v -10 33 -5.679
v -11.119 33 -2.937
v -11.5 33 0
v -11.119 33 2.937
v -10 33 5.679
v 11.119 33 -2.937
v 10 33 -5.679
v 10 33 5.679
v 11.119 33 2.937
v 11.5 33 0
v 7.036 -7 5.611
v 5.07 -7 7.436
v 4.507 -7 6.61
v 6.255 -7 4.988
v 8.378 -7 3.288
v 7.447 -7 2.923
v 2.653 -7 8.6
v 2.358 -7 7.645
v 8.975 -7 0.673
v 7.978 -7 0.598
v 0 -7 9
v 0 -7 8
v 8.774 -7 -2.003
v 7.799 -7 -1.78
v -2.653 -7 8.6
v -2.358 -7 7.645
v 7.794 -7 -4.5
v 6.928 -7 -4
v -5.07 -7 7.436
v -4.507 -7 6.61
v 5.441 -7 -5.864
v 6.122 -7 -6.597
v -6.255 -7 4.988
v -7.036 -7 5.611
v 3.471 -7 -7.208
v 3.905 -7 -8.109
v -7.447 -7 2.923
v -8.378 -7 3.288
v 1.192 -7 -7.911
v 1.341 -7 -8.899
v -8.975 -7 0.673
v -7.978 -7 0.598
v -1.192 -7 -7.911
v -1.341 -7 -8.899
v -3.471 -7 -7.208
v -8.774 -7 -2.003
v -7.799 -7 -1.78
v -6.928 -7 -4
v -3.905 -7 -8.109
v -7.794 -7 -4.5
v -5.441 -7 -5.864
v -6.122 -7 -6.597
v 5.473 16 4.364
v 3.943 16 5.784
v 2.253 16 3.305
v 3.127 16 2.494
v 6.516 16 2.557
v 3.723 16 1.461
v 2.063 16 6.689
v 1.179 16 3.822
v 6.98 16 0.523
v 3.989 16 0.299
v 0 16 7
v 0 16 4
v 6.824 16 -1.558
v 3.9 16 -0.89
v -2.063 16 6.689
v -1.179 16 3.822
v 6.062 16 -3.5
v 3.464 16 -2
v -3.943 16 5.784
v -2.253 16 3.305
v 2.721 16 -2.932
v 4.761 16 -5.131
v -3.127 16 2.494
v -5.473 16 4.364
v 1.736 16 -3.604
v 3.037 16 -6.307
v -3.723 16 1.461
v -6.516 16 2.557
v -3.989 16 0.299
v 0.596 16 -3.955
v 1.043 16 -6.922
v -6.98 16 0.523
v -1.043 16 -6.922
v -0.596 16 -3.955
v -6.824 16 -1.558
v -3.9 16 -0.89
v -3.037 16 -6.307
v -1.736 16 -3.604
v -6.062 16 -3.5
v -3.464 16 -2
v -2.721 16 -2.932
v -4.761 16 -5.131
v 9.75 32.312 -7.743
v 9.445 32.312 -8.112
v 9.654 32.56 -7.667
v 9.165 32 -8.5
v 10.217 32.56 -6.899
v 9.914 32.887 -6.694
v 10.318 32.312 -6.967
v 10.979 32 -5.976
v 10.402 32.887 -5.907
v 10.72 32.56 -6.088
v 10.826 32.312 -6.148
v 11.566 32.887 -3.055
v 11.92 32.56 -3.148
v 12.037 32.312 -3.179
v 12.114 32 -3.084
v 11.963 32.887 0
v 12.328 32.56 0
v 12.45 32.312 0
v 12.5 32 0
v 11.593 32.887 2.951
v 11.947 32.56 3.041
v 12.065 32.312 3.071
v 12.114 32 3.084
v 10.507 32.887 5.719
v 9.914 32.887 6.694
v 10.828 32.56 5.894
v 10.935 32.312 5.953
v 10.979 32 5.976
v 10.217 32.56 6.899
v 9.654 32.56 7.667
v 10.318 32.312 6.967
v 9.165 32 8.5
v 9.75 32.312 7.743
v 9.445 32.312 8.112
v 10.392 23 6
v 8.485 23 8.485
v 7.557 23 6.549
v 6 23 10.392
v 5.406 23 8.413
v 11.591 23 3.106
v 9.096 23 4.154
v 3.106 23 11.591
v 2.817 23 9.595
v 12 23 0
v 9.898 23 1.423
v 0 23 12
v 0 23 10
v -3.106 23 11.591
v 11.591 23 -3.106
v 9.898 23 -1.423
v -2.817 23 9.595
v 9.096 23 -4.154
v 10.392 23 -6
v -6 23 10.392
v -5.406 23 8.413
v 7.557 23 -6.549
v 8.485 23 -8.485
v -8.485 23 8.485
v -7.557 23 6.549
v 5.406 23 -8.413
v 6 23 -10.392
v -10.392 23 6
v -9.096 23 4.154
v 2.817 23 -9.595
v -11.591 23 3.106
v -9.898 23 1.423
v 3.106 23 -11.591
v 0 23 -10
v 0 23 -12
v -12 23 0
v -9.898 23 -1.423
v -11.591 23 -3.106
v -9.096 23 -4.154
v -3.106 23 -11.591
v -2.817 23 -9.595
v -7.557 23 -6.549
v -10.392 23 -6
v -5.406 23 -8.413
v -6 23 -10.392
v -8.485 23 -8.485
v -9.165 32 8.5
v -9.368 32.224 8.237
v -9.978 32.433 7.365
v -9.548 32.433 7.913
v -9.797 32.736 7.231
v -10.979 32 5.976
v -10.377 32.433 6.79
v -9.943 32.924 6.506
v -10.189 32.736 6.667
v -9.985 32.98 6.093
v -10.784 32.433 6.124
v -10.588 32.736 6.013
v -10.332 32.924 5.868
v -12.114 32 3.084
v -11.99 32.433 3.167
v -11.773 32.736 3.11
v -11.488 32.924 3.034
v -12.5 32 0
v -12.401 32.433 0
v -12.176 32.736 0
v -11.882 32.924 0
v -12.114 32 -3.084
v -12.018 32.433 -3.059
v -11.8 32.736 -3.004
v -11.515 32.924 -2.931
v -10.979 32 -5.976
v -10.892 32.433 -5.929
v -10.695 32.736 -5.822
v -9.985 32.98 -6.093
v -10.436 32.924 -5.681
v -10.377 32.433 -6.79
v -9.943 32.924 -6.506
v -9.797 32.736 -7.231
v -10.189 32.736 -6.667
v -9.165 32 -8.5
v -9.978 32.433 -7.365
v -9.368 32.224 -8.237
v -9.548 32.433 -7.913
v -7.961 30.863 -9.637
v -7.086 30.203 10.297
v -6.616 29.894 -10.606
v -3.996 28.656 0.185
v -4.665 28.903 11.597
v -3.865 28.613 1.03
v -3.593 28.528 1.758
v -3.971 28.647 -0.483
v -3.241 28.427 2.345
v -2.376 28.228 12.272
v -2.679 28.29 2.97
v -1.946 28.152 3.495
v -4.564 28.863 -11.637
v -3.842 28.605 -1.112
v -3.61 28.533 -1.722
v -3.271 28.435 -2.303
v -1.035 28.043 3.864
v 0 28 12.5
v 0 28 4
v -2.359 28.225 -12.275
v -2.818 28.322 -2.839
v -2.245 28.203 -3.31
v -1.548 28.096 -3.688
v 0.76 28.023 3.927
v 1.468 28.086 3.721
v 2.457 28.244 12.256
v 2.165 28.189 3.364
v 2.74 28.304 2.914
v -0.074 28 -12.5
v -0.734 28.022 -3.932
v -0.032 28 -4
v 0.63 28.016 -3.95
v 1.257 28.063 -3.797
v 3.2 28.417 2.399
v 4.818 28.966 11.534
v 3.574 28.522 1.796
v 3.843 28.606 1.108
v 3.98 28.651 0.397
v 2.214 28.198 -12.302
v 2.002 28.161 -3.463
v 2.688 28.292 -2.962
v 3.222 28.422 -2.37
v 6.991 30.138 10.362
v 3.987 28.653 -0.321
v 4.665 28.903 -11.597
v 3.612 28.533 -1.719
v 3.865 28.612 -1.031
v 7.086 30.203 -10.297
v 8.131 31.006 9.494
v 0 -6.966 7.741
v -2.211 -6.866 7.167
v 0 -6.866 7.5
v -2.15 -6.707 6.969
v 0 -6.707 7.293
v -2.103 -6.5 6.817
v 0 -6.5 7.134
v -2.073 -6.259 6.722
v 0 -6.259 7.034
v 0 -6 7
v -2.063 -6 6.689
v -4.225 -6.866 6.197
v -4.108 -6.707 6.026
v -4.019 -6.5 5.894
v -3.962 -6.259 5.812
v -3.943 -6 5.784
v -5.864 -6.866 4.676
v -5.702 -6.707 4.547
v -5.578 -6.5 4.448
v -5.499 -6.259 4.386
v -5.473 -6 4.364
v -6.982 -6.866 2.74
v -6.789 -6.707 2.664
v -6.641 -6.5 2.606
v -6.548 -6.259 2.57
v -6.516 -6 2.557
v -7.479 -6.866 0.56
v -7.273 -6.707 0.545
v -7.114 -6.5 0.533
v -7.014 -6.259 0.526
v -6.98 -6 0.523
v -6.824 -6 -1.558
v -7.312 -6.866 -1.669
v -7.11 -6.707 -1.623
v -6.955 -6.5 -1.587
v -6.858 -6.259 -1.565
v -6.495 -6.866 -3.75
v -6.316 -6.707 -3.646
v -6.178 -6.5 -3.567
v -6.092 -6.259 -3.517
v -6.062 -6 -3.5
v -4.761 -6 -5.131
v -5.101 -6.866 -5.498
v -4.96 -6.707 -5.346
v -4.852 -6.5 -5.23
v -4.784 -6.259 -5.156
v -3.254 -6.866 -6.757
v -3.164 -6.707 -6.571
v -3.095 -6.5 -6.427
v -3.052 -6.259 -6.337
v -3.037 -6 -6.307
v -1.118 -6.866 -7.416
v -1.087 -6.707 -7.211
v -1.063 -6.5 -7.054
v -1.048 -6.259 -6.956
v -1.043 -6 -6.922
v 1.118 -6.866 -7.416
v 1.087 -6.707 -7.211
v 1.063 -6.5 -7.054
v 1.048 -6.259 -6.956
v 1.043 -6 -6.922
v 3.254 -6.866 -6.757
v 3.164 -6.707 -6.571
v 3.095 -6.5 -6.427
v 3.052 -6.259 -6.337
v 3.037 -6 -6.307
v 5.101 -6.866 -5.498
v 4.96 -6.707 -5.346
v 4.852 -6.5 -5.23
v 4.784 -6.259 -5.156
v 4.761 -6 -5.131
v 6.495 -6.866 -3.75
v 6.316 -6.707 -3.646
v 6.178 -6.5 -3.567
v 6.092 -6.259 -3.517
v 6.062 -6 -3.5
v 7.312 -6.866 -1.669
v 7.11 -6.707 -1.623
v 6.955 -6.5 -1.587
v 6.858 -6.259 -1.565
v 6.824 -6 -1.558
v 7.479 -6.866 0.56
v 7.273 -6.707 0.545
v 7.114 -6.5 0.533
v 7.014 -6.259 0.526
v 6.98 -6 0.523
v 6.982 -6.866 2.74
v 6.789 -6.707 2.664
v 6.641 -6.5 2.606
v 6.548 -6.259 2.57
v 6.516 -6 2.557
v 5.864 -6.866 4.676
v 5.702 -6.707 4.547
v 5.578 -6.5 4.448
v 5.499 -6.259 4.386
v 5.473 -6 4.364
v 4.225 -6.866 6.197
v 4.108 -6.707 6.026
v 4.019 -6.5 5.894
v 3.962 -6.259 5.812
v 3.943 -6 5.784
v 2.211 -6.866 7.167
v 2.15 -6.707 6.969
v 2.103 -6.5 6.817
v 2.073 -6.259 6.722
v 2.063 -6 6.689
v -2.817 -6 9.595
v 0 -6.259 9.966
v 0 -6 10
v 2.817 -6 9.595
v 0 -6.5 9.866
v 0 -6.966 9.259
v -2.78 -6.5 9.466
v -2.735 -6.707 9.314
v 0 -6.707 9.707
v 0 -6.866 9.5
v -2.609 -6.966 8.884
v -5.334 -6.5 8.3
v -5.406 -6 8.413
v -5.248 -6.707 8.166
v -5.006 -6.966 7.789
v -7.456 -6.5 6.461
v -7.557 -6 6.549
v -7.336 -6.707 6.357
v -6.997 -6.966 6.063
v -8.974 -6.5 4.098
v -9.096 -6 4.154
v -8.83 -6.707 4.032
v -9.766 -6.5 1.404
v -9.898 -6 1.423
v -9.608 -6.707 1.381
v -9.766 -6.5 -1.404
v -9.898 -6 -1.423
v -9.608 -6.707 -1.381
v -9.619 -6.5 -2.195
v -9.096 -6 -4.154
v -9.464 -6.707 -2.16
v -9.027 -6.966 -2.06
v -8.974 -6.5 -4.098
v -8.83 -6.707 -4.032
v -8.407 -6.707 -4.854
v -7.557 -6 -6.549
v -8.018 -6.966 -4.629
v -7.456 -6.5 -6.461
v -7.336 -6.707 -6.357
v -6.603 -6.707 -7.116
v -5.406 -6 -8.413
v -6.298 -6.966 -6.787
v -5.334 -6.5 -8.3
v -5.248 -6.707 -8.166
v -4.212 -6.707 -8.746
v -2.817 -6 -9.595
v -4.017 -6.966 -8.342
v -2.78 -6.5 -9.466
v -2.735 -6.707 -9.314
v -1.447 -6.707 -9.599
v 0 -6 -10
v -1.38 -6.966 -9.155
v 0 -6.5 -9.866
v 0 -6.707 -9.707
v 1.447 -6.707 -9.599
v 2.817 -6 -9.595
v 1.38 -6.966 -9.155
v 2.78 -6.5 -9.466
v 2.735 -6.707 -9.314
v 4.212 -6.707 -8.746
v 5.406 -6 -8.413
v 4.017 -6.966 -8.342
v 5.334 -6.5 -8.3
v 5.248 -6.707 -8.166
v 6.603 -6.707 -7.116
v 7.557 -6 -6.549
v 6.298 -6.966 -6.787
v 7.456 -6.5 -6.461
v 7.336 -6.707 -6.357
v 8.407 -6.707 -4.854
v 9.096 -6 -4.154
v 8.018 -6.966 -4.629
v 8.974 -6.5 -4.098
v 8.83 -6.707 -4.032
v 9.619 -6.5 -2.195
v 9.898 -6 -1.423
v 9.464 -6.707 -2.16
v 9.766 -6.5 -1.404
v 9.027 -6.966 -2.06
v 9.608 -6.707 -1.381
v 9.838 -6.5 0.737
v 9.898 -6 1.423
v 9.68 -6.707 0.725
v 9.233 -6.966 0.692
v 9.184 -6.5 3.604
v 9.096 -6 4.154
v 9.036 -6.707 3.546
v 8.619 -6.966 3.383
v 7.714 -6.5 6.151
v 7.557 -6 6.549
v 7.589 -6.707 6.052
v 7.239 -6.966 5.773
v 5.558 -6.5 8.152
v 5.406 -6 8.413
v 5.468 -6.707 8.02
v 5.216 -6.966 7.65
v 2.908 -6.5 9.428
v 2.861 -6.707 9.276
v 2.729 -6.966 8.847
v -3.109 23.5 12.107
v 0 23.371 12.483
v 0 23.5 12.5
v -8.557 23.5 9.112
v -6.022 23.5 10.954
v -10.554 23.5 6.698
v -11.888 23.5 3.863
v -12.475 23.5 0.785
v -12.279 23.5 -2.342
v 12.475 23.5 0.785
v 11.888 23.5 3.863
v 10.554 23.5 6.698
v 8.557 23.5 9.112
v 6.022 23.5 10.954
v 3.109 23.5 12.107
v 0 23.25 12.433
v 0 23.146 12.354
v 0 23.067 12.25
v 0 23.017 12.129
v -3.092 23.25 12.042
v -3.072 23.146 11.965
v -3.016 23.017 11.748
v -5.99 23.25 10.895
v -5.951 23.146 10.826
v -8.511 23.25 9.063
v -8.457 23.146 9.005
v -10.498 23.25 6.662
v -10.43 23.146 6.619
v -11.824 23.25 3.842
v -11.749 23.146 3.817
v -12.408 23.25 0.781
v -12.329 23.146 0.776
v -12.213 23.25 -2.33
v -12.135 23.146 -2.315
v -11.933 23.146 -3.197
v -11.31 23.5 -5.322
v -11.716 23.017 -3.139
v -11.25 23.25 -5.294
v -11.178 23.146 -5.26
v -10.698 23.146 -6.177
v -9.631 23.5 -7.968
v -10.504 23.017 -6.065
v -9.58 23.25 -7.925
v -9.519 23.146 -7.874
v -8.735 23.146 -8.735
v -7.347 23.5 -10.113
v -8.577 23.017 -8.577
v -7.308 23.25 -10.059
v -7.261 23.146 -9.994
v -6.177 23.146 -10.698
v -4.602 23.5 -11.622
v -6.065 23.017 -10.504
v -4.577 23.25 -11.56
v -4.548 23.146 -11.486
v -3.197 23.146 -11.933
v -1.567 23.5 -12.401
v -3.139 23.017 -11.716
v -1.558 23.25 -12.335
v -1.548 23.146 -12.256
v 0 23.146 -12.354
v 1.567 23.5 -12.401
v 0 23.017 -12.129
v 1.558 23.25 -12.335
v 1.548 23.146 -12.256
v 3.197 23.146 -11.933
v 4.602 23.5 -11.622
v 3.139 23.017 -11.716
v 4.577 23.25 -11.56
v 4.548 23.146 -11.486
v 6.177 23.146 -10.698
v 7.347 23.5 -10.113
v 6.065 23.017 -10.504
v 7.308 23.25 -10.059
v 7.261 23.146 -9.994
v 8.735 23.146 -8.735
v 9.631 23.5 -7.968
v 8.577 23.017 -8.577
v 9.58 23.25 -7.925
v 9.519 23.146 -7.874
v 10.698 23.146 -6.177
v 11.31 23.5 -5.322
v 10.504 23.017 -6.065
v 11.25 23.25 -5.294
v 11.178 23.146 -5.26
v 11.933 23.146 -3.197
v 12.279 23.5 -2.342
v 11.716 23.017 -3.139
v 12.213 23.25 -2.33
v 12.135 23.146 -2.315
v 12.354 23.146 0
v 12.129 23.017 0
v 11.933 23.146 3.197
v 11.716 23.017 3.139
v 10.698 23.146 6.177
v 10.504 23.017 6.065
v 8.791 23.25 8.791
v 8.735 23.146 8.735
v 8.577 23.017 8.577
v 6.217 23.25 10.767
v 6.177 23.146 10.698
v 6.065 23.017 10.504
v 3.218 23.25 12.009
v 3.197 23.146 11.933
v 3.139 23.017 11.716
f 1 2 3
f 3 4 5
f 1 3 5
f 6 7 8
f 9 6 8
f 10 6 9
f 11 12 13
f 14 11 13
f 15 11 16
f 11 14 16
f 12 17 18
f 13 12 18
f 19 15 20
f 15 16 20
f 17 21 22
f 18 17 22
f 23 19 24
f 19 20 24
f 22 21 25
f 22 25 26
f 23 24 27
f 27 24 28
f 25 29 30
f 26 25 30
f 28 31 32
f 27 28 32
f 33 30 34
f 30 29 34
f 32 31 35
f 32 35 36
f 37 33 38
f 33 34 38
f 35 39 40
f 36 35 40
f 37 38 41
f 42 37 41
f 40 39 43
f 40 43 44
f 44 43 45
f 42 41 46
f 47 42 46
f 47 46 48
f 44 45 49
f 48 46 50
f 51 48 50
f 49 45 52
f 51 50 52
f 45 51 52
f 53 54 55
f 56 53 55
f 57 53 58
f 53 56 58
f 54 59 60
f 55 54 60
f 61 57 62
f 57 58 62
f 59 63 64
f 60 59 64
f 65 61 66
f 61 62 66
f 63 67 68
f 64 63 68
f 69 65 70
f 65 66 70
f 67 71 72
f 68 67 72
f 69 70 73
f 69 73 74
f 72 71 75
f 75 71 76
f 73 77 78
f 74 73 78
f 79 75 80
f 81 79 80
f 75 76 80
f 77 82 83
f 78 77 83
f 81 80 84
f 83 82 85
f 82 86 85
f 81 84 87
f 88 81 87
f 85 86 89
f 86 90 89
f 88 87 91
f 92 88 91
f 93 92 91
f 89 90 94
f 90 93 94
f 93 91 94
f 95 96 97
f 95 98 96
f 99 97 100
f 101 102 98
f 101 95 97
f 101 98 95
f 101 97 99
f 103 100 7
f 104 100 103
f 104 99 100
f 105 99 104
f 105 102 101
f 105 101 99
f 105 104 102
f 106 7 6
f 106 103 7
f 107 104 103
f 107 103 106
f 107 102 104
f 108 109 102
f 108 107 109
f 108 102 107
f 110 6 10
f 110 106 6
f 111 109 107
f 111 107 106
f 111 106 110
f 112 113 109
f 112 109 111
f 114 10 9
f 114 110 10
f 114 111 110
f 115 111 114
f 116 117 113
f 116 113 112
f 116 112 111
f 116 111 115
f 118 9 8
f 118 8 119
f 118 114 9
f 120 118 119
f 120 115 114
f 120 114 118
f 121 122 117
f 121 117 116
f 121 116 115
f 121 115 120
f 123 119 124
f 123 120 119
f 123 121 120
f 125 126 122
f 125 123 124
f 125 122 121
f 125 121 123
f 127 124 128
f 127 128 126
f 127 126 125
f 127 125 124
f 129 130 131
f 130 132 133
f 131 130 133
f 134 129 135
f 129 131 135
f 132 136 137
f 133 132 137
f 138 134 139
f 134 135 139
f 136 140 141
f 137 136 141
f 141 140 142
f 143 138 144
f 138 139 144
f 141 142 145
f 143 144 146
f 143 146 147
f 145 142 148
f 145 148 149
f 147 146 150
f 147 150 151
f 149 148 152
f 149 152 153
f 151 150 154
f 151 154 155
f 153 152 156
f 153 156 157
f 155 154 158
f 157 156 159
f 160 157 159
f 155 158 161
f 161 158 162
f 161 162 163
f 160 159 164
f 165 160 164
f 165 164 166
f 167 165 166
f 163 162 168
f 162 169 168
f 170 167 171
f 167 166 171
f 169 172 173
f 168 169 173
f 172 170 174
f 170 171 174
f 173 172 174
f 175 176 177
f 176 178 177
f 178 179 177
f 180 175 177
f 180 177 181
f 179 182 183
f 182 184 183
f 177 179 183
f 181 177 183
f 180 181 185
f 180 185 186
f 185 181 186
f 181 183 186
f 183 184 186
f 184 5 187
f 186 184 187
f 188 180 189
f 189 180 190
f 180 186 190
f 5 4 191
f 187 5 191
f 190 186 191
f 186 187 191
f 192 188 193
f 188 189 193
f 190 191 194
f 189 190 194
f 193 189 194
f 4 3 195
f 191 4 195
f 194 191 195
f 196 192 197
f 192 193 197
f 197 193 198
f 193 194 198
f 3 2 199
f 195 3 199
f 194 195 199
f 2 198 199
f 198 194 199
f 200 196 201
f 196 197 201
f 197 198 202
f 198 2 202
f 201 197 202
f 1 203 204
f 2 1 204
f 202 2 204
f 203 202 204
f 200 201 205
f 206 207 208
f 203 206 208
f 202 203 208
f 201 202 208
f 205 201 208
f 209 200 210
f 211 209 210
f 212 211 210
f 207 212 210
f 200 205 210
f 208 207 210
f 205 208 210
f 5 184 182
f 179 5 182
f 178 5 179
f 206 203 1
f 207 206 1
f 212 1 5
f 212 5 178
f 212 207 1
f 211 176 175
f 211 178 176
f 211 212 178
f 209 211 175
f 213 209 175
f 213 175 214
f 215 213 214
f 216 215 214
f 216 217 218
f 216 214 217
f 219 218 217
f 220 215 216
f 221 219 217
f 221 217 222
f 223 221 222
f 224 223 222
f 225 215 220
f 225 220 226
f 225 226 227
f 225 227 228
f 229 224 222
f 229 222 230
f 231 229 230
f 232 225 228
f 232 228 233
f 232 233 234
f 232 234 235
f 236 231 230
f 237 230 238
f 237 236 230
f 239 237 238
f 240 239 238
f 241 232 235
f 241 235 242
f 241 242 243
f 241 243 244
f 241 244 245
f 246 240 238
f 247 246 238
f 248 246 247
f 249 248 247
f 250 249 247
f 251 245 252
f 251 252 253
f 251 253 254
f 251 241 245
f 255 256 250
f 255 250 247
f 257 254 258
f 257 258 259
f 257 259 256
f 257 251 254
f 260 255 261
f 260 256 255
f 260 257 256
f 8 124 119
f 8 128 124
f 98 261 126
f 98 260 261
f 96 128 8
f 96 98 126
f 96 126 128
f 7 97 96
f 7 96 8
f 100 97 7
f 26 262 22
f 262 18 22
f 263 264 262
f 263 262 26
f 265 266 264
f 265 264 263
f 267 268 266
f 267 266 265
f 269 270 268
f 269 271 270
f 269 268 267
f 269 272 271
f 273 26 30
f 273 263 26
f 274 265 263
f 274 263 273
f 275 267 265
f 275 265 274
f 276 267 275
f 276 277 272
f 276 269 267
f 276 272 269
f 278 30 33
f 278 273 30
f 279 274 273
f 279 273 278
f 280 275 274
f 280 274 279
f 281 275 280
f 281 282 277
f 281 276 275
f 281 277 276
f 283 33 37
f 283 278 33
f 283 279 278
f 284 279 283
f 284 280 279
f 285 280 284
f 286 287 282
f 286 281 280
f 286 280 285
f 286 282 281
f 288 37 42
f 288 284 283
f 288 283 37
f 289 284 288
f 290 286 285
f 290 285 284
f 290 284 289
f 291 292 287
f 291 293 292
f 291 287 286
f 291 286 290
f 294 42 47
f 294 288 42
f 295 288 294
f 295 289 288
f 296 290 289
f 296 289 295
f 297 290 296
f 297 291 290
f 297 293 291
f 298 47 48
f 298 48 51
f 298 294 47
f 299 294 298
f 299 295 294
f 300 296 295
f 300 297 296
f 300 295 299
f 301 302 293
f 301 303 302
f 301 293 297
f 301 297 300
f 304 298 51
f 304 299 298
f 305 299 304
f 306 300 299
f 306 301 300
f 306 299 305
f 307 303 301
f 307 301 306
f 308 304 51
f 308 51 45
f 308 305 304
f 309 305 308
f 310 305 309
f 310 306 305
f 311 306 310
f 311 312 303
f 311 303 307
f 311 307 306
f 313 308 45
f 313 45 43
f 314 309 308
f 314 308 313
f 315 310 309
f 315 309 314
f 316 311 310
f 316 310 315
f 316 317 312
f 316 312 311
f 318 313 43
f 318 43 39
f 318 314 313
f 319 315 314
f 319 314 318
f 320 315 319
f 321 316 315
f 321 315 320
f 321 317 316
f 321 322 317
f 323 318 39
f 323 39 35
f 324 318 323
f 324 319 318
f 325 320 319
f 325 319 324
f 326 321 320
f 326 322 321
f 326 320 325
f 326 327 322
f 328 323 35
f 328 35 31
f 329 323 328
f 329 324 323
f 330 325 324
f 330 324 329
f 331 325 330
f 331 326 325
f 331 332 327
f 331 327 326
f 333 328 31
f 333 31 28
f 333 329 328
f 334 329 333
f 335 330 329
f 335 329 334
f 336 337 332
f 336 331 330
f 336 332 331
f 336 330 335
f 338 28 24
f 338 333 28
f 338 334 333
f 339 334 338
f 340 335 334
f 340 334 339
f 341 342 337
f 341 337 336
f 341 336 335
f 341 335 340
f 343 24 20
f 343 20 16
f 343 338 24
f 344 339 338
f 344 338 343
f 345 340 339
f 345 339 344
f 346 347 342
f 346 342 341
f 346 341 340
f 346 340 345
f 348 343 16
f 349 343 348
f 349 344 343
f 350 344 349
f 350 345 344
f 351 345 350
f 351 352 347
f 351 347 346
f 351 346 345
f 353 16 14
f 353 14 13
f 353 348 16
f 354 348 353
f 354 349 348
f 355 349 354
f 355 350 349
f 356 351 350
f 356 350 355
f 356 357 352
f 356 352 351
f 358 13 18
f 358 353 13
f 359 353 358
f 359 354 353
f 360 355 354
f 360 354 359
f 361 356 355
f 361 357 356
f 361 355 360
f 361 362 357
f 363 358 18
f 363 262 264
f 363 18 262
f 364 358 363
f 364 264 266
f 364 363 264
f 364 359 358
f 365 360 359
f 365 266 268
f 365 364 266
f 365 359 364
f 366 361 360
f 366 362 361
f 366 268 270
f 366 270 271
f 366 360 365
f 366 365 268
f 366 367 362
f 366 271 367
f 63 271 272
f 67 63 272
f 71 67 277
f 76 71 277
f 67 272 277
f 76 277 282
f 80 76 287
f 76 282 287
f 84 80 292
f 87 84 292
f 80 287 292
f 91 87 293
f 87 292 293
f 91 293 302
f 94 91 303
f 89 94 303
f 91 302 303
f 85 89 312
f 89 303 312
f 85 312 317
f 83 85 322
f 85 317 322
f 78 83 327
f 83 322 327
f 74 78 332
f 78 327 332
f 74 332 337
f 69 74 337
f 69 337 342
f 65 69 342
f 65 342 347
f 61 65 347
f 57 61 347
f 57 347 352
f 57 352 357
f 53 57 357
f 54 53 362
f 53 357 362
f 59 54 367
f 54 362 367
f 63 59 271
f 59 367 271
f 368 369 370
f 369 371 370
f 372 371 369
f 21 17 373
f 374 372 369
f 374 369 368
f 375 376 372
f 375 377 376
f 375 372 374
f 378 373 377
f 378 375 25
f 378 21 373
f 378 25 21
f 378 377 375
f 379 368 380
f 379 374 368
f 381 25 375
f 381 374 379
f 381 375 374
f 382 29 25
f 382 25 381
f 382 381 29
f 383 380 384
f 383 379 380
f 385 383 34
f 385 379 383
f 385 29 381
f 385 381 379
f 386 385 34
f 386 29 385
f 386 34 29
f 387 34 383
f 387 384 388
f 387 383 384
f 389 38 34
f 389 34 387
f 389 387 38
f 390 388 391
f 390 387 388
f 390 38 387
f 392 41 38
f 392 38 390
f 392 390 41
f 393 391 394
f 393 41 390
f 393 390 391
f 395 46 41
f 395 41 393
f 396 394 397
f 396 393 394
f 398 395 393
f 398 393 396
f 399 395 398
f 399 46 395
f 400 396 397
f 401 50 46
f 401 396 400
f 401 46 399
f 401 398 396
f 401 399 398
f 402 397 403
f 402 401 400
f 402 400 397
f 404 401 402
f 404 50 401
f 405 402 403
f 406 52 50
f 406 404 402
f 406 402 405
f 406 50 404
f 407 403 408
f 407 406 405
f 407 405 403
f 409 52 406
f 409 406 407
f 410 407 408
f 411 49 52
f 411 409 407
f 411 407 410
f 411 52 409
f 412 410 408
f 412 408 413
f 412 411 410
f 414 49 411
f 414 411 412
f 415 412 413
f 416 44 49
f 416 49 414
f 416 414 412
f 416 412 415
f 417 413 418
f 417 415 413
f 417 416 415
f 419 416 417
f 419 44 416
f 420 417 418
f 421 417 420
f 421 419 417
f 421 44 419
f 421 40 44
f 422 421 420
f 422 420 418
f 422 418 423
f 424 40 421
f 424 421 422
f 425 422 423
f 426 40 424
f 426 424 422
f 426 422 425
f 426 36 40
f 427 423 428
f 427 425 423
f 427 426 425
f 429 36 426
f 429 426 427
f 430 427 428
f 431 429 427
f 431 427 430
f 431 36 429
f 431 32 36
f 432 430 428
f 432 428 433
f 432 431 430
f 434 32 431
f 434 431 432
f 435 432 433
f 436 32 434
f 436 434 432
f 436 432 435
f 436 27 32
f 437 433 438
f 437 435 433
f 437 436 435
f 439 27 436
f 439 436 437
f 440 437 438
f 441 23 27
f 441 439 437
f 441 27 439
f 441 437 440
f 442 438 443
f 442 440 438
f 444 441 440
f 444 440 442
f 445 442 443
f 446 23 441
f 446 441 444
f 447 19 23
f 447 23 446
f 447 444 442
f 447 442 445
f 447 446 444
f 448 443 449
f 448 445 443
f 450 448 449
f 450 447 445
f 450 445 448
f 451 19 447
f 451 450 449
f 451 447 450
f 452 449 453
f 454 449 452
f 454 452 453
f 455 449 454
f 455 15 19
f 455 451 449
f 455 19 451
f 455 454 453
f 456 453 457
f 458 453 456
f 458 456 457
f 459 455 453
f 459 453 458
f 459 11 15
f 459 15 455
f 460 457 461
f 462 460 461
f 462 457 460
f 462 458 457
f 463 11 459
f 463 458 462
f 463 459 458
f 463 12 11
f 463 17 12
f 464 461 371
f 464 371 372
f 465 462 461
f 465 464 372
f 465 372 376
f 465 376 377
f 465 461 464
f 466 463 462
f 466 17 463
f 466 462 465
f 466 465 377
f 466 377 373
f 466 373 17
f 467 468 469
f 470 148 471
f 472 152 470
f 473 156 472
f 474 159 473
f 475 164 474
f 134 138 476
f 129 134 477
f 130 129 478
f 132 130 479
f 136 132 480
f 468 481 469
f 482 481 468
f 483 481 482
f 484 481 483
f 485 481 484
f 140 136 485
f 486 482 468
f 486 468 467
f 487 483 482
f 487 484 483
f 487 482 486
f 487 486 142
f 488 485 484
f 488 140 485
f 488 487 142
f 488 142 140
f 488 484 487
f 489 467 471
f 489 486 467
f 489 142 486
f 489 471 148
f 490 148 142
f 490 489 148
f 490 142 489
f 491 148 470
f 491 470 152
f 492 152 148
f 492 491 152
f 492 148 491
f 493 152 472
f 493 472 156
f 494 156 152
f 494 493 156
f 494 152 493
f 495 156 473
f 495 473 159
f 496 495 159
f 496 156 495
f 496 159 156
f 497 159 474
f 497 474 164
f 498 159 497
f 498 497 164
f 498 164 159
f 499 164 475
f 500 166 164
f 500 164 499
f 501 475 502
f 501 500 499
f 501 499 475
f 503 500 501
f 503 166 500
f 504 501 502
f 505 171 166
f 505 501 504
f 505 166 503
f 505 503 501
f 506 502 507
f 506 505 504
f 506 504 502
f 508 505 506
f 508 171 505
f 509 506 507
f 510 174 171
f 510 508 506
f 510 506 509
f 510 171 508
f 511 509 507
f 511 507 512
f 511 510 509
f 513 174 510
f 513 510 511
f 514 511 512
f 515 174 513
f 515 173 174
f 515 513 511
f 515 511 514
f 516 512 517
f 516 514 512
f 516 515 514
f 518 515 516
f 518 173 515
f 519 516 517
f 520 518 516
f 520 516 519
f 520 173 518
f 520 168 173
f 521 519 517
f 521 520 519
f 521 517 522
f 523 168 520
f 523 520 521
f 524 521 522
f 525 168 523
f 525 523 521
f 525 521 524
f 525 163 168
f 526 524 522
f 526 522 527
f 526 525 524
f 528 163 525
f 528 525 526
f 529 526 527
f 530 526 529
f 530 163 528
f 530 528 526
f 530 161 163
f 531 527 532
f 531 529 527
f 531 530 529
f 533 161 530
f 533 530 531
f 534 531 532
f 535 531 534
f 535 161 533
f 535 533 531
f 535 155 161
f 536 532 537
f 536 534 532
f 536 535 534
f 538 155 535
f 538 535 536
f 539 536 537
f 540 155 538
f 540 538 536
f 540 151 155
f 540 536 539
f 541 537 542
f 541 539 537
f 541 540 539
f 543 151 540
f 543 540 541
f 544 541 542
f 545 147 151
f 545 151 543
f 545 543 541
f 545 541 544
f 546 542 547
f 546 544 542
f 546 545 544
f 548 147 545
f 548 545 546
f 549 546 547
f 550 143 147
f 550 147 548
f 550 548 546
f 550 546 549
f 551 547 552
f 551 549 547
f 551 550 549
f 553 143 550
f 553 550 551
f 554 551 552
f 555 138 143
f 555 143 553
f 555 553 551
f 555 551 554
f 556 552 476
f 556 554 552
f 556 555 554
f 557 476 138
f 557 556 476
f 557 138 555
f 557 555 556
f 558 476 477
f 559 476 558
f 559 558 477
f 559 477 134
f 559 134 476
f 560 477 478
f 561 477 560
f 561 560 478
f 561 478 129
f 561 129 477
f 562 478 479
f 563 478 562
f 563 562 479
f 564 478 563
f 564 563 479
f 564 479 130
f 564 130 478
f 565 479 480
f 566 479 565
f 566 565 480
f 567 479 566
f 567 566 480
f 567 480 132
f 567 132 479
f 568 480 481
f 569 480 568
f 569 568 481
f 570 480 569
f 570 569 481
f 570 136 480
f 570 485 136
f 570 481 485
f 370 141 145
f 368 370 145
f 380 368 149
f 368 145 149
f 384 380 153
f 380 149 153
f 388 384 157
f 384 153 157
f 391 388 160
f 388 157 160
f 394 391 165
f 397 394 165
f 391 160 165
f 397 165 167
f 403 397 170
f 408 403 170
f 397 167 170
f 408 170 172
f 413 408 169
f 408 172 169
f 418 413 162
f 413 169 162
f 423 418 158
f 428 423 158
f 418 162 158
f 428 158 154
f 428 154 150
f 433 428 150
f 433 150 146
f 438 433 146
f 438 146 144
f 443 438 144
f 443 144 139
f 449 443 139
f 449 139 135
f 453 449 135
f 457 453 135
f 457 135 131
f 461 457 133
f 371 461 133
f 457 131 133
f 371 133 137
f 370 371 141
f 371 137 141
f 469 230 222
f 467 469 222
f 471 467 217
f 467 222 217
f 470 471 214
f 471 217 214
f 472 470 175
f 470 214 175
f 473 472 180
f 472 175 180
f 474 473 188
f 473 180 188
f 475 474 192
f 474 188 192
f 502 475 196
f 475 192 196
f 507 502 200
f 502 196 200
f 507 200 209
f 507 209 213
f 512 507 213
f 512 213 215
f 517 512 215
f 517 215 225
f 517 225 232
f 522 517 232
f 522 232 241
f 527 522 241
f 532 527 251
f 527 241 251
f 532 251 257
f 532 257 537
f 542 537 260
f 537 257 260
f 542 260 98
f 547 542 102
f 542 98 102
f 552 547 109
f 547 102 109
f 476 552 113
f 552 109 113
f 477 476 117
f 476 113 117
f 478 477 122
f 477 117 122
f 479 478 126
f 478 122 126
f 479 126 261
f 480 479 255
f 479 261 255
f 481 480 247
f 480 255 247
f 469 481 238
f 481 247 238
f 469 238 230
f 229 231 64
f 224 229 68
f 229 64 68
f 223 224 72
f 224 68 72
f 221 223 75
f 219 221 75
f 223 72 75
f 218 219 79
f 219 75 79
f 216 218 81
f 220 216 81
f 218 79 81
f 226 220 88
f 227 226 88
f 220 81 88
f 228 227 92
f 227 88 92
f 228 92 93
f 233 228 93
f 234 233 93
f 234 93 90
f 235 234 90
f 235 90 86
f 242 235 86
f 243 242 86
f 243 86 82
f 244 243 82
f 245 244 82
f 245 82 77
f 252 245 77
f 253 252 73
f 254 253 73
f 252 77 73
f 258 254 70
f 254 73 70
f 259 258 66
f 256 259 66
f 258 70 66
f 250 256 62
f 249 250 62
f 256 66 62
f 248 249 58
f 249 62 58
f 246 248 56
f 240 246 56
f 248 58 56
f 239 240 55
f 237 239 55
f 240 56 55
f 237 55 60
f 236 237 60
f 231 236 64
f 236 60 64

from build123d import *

# Parameters (mm, degrees)
CUT_EXTRUDE_1_DEPTH      = 38.436613095
CUT_EXTRUDE_1_DEPTH_BACK = 38.436613095
SKETCH_2_R               = 12.5
FILLET_1_R               = 1
FILLET_2_R               = 0.5
FILLET_3_R               = 1


with BuildPart() as part:
    # Эскиз1 → Повернуть1 (revolve)
    with BuildSketch(Plane.XY, mode=Mode.PRIVATE) as revolve_1_sk:
        Polygon((-4, 33), (-4, 16), (-7, 16), (-7, -7), (-10, -7), (-10, 23), (-12.5, 23), (-12.5, 33), align=None)
    revolve(revolve_1_sk.sketch.rotate(Axis((0, 98.834265919, 0), (0, -1, 0)), 270), axis=Axis((0, 98.834265919, 0), (0, -1, 0)))

    # Эскиз2 → Вырез-Вытянуть1 (cut, two sides: drawn at the far end of the back side and taken through both)
    with BuildSketch(Plane.XY.offset(-CUT_EXTRUDE_1_DEPTH_BACK)):
        with Locations((0, 40.5)):
            Circle(SKETCH_2_R)
    extrude(amount=CUT_EXTRUDE_1_DEPTH + CUT_EXTRUDE_1_DEPTH_BACK, mode=Mode.SUBTRACT)

    # Скругление1
    fillet_1_edges = [part.edges().sort_by_distance(p)[0] for p in [
        (12.5, 33, 0),
        (-12.5, 33, 0),
    ]]
    fillet(fillet_1_edges, radius=FILLET_1_R)

    # Скругление2
    fillet_2_edges = [part.edges().sort_by_distance(p)[0] for p in [
        (0, 23, -12.5),
    ]]
    fillet(fillet_2_edges, radius=FILLET_2_R)

    # Скругление3
    fillet_3_edges = [part.edges().sort_by_distance(p)[0] for p in [
        (0, -7, -10),
        (0, -7, -7),
    ]]
    fillet(fillet_3_edges, radius=FILLET_3_R)


solid = part.part
